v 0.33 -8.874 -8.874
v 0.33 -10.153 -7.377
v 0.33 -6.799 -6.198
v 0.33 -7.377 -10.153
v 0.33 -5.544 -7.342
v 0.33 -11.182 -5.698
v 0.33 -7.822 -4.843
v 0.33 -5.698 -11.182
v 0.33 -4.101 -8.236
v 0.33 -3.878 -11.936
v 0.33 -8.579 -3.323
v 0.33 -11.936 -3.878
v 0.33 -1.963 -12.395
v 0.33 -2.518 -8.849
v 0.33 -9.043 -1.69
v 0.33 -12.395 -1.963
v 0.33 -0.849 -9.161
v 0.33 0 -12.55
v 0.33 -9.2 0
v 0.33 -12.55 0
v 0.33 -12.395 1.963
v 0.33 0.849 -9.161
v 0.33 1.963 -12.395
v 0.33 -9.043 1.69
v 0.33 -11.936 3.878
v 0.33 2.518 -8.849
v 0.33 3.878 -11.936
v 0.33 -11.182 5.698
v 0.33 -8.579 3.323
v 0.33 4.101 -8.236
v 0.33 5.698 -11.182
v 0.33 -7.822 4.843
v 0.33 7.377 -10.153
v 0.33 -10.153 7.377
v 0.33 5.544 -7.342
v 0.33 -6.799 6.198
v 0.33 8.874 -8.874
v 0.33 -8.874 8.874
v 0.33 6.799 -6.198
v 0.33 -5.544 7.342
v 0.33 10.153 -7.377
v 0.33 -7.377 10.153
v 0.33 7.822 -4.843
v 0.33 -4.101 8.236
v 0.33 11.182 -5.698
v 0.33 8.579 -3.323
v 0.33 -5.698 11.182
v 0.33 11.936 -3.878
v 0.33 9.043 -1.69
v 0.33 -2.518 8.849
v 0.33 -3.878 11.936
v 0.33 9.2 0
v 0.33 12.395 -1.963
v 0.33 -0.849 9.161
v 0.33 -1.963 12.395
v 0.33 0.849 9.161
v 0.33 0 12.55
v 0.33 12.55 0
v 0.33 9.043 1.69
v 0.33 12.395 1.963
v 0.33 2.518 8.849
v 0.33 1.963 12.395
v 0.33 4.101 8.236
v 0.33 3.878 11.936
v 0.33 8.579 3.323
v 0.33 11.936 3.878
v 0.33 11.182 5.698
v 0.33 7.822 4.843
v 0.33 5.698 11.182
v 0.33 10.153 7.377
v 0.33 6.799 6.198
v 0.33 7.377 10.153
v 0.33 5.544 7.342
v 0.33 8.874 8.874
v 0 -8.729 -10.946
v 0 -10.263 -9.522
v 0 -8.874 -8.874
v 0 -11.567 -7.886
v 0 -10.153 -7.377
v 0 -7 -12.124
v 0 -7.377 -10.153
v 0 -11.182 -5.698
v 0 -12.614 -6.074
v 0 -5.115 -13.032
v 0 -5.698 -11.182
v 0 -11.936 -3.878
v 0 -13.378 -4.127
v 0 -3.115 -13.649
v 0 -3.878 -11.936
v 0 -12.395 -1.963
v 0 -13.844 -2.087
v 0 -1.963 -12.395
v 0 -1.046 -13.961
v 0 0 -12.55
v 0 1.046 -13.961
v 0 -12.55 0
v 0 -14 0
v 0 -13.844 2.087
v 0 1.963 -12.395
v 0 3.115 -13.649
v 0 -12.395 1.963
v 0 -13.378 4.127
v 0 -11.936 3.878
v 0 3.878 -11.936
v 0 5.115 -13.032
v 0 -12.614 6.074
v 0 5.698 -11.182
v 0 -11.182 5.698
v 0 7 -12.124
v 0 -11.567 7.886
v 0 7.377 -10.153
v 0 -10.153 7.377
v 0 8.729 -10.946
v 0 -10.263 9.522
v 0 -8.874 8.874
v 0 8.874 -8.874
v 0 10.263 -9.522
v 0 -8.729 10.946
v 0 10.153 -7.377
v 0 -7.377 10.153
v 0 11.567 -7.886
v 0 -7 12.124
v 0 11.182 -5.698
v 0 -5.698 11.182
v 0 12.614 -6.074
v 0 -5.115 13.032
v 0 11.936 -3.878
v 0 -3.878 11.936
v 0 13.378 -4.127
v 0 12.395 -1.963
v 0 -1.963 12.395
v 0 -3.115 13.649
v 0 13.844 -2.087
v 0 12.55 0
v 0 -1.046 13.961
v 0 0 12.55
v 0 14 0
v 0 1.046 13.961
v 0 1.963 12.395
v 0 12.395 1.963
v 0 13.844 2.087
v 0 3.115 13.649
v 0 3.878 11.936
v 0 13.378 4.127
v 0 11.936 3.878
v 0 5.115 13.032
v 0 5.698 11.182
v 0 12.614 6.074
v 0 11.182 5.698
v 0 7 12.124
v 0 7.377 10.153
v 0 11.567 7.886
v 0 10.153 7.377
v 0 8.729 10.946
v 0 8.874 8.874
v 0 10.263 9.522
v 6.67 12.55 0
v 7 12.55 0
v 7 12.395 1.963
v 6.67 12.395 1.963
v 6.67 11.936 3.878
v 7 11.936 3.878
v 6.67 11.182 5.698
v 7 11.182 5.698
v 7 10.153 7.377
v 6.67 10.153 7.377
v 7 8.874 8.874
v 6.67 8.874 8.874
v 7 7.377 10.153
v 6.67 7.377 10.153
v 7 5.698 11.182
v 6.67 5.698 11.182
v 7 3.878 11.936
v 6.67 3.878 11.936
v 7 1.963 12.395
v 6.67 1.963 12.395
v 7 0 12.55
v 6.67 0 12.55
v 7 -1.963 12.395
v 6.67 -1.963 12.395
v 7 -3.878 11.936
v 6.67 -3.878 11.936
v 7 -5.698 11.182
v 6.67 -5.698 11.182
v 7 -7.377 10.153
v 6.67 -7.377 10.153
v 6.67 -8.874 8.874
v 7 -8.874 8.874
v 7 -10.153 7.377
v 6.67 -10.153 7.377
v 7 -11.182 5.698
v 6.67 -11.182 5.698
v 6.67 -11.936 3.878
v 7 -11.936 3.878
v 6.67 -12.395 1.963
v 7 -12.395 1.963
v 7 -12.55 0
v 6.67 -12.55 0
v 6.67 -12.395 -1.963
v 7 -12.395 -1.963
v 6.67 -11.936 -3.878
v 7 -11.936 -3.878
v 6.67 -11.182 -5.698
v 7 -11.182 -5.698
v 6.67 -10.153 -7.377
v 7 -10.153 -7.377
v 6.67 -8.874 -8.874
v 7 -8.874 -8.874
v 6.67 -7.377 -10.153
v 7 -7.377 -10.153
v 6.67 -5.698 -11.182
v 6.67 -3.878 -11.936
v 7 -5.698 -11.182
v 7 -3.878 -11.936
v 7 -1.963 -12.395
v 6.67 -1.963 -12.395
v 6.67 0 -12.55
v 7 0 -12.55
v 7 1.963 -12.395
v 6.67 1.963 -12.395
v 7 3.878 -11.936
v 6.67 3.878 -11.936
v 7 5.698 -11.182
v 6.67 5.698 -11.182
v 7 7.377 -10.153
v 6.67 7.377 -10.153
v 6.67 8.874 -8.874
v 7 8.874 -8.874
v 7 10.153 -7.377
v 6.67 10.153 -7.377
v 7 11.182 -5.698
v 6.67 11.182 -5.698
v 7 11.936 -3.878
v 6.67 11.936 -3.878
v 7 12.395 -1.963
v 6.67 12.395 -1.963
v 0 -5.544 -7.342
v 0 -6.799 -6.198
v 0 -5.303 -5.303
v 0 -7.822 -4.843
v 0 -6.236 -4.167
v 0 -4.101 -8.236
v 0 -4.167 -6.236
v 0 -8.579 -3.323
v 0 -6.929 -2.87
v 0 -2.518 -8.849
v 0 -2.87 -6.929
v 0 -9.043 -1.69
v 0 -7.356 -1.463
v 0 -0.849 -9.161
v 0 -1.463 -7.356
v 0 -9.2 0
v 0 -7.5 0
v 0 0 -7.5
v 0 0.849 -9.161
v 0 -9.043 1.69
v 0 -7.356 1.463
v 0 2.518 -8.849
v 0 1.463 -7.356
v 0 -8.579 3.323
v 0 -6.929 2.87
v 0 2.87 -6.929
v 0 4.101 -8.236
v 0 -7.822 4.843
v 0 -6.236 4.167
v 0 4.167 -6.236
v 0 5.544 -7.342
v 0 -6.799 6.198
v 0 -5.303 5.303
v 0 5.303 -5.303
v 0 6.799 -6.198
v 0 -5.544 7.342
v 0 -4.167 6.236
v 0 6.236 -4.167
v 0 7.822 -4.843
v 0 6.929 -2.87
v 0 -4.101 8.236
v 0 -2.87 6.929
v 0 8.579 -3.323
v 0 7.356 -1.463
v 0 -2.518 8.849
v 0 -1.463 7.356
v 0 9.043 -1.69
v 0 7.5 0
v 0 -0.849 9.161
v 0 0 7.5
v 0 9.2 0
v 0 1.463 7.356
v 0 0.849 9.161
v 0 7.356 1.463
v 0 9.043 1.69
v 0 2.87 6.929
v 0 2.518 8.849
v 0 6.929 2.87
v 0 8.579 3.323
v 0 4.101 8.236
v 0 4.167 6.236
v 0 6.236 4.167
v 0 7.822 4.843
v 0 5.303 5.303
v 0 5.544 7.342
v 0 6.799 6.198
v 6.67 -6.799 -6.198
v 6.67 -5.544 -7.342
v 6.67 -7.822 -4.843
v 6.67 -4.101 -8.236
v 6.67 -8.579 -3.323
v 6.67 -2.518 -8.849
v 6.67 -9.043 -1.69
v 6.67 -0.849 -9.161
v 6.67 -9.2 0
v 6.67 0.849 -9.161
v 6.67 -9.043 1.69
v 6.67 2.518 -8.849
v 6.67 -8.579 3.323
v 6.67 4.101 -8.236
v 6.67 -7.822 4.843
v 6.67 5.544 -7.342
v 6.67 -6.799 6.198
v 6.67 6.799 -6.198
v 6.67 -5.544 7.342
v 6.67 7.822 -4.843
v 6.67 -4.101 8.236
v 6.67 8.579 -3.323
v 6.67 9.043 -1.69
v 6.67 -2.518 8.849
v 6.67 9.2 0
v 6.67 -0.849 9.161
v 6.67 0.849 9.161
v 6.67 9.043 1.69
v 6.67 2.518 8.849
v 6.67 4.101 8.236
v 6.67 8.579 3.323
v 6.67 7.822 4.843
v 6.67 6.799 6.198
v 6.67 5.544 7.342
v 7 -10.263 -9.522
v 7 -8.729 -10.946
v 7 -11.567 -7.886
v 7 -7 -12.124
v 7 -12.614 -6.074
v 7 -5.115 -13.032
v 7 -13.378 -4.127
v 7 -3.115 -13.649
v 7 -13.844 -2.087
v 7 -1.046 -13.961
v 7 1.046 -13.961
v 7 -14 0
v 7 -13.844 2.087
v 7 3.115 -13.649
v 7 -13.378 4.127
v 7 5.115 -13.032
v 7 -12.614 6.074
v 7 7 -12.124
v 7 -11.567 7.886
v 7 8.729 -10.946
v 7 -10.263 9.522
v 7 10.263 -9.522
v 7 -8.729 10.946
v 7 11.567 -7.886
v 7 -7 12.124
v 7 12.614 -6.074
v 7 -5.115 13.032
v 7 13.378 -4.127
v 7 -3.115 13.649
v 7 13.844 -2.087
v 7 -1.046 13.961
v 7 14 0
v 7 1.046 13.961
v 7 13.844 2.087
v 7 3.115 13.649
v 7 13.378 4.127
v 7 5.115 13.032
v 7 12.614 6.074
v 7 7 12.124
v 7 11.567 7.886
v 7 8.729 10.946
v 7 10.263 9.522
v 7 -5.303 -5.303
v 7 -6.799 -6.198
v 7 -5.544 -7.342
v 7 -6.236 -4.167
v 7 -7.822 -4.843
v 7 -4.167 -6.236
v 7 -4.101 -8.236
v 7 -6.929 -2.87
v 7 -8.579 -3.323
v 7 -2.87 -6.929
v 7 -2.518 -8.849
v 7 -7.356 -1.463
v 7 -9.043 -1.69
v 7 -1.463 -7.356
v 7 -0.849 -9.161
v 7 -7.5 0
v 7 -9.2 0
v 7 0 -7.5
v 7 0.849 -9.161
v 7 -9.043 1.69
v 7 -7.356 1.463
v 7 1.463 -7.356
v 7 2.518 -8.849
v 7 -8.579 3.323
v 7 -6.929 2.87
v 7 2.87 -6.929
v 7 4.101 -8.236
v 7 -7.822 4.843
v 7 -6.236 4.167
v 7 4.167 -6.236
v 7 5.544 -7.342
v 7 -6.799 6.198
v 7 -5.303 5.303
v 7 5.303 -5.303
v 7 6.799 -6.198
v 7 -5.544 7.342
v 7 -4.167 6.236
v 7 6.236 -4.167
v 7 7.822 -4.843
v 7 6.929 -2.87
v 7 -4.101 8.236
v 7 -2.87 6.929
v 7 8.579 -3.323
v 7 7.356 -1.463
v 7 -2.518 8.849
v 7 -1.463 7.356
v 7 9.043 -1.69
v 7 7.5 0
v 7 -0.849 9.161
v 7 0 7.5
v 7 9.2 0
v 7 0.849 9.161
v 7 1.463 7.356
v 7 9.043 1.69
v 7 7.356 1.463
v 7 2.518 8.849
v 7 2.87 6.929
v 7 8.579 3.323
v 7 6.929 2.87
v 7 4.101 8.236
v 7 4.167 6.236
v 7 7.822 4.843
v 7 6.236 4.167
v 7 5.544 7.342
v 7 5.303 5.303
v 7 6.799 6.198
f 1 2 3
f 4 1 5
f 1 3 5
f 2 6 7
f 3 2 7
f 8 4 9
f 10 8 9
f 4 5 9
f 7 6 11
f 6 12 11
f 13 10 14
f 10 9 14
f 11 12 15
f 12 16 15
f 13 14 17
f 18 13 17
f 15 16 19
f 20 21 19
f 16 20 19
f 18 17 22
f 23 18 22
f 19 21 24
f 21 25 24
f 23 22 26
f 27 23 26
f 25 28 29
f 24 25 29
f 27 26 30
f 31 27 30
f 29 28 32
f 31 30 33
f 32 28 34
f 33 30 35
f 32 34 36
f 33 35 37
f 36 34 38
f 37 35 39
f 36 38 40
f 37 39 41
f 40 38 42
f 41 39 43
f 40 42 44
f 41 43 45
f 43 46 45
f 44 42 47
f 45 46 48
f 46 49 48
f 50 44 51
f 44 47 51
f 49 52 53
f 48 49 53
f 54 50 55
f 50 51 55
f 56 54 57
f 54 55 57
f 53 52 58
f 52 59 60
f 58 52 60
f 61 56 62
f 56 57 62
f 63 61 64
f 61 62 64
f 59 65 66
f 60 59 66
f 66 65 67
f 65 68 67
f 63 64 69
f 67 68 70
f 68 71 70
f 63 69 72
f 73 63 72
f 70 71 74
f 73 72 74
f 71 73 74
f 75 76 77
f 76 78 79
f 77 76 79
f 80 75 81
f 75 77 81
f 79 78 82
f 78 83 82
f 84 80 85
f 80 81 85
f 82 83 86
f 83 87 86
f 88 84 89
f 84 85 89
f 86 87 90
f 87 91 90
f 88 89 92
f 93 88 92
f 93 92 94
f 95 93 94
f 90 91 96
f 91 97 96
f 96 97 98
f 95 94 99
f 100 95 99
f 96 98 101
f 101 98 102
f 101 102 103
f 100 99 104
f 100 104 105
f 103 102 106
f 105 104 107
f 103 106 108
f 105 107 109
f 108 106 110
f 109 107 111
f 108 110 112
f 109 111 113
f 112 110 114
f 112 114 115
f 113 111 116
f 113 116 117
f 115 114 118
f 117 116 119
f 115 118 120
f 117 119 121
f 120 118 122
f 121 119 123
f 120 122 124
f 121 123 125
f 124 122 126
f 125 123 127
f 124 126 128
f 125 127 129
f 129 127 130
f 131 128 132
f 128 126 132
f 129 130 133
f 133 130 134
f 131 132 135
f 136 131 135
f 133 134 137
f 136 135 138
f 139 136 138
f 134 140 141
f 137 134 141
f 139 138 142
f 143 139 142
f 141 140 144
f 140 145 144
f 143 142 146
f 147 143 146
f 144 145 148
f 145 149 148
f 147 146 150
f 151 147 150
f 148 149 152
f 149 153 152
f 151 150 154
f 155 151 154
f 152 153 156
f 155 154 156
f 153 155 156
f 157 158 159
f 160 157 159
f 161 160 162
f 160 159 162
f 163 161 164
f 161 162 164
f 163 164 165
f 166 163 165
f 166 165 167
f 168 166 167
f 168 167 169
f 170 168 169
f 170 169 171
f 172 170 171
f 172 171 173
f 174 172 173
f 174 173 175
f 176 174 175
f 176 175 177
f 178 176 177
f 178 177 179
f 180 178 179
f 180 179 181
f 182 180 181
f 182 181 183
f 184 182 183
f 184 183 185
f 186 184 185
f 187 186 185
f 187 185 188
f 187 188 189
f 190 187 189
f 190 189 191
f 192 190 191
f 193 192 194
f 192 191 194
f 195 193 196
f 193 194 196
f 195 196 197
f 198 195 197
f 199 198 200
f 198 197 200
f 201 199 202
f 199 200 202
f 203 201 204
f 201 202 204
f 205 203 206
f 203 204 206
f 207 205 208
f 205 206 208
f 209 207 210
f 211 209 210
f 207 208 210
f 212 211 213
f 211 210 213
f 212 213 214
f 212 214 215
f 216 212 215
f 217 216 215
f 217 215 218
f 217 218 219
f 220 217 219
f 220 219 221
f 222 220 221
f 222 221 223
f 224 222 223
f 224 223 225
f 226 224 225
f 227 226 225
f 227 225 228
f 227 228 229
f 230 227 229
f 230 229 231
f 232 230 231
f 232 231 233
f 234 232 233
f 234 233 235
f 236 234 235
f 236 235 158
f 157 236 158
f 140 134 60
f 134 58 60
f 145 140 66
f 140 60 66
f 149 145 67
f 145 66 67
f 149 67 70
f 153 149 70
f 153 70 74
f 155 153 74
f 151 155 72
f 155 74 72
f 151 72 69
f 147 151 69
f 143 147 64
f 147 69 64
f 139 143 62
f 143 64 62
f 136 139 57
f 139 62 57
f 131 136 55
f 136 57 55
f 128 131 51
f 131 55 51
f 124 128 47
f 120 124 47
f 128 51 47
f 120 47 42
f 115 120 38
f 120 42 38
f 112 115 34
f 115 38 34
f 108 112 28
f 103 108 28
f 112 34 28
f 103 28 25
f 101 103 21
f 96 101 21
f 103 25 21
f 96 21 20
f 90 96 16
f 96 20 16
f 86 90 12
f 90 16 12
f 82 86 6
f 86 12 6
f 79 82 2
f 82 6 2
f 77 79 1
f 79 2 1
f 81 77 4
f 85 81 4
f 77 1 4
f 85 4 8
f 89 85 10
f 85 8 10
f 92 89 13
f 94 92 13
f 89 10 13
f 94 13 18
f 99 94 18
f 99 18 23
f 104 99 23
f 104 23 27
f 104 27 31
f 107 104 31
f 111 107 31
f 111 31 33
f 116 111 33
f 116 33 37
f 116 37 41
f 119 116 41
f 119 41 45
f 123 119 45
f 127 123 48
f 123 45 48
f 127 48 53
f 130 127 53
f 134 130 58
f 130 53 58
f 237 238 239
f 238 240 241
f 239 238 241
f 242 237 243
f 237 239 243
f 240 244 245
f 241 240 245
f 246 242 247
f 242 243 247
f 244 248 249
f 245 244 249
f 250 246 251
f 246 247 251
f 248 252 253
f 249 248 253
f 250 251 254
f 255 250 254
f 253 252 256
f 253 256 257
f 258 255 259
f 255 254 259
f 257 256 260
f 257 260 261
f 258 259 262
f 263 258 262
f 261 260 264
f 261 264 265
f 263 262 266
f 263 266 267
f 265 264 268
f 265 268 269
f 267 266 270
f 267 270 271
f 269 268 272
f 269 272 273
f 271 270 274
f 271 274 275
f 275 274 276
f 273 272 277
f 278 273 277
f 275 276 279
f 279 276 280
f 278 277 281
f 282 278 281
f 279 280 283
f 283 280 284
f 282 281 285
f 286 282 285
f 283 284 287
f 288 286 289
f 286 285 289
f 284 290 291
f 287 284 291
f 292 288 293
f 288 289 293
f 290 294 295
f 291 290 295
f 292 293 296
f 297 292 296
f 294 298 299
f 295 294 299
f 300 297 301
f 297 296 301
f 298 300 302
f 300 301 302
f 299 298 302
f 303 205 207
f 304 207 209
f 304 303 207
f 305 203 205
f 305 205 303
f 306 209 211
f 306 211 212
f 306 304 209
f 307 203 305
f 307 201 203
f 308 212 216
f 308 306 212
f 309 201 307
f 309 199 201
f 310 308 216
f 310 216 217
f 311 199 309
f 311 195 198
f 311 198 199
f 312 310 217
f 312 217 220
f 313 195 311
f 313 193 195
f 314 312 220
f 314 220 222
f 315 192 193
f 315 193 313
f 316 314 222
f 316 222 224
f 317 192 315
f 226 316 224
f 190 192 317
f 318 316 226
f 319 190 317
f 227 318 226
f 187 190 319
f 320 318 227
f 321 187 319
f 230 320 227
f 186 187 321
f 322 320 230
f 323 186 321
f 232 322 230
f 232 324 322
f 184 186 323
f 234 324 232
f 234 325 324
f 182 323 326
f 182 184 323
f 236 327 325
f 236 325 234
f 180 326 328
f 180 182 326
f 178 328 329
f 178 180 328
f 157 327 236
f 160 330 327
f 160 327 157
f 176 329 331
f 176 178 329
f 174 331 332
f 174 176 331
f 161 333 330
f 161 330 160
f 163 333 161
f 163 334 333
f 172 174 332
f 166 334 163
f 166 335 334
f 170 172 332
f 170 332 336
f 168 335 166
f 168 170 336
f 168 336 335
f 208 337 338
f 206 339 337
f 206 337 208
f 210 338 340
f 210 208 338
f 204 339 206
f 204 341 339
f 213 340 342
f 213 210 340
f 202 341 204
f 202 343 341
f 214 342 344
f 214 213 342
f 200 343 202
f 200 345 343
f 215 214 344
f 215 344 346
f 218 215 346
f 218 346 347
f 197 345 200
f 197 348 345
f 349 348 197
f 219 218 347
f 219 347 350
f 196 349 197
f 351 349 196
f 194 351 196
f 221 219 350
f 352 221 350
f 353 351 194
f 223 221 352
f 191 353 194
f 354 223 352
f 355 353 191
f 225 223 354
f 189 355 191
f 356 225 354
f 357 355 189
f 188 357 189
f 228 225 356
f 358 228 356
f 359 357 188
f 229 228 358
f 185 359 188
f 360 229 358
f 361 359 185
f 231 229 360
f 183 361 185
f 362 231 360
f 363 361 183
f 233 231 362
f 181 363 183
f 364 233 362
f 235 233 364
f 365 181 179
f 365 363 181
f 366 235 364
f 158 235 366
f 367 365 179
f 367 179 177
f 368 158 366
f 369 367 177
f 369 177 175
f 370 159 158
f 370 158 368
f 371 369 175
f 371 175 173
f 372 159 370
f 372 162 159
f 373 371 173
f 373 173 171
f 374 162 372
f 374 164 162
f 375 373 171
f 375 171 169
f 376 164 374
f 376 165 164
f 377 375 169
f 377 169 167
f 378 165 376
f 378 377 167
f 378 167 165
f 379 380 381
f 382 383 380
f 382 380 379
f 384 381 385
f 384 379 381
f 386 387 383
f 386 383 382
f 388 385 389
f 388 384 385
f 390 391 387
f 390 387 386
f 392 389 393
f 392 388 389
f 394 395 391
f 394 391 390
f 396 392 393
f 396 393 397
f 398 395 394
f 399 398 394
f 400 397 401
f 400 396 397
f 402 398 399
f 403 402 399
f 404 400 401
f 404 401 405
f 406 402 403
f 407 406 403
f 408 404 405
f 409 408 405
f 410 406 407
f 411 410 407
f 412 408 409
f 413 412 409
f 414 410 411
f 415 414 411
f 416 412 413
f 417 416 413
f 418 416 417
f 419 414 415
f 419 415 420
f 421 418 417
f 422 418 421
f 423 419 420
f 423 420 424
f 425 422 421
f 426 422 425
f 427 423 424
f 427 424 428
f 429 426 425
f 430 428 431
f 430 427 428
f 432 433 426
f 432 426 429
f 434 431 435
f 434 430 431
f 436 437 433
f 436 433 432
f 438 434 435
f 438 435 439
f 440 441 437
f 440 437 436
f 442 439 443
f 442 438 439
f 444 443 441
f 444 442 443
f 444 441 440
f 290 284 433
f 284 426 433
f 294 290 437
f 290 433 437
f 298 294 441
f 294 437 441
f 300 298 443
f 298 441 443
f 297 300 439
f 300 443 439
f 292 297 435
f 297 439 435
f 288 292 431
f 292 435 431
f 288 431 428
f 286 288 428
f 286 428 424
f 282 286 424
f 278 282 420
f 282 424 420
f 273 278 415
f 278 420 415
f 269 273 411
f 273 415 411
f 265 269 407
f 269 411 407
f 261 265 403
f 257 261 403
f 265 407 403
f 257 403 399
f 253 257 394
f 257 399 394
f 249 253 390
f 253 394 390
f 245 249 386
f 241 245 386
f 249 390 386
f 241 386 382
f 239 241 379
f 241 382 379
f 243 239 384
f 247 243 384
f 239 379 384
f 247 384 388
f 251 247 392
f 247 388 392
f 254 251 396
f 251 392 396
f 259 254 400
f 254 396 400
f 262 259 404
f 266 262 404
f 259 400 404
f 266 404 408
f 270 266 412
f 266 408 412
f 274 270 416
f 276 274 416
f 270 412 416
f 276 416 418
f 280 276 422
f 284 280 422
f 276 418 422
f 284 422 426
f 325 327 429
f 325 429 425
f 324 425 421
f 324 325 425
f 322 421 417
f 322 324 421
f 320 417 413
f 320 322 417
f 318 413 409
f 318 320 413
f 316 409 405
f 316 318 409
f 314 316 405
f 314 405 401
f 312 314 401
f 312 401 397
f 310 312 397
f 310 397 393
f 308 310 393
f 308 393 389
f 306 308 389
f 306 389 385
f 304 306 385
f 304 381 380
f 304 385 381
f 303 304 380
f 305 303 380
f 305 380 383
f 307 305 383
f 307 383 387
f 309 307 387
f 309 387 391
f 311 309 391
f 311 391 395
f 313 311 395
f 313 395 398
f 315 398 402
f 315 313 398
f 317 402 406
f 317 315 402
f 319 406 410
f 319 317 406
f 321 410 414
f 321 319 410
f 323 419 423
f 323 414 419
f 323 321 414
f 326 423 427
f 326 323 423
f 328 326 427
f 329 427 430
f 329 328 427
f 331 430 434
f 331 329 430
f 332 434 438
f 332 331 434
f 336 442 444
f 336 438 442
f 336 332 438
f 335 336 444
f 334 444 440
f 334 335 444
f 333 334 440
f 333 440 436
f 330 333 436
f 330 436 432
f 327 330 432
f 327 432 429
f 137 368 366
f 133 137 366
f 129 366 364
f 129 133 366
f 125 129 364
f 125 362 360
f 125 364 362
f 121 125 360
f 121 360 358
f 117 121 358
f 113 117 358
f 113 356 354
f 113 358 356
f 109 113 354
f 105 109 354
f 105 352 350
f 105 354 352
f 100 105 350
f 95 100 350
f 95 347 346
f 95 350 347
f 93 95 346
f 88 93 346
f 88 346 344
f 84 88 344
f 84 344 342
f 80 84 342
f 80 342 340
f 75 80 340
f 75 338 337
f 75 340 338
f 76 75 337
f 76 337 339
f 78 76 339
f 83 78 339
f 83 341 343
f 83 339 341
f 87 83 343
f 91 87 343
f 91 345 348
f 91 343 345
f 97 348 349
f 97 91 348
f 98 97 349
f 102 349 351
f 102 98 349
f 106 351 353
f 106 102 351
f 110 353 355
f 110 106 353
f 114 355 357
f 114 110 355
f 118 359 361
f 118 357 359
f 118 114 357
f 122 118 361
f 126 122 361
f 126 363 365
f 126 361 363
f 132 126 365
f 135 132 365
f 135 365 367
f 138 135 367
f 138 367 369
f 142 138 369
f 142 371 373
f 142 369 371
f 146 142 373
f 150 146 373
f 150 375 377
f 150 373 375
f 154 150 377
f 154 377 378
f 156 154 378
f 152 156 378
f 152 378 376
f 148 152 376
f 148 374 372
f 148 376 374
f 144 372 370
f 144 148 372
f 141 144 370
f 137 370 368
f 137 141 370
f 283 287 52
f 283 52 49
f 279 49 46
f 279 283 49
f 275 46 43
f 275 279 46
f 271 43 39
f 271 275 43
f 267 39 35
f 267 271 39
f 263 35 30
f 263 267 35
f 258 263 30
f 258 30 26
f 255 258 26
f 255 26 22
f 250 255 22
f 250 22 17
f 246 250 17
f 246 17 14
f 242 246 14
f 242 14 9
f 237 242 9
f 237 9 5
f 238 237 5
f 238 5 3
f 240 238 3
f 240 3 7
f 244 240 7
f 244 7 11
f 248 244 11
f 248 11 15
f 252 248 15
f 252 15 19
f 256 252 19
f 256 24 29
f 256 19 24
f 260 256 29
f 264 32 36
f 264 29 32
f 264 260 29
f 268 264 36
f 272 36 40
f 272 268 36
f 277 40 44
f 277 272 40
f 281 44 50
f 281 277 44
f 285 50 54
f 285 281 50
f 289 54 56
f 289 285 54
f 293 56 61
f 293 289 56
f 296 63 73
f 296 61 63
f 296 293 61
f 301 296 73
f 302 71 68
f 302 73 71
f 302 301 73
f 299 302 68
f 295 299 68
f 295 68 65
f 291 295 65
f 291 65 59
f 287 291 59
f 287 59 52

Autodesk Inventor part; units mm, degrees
sketch "Sketch_1" plane through (0, 0, 0) normal (0, 0, 1) x (1, 0, 0)
  line L0 (50, 0) -> (-50, 0)
  line L1 (0, 12.55) -> (0.33, 12.55)
  line L2 (0.33, 12.55) -> (0.33, 9.2)
  line L3 (0.33, 9.2) -> (0, 9.2)
  line L4 (0, 9.2) -> (0, 7.5)
  line L5 (0, 7.5) -> (7, 7.5)
  line L6 (7, 7.5) -> (7, 9.2)
  line L7 (7, 9.2) -> (6.67, 9.2)
  line L8 (6.67, 9.2) -> (6.67, 12.55)
  line L9 (6.67, 12.55) -> (7, 12.55)
  line L10 (7, 12.55) -> (7, 14)
  line L11 (7, 14) -> (0, 14)
  line L12 (0, 14) -> (0, 12.55)
revolve "Revolution1" add sketch "Sketch_1" angle 360 about axis through (50, 0, 0) along (1, 0, 0)
ref_plane "to_cp1_XY" through (0, 0, 0) normal (1, 0, 0) x (0, 0, -1)
ref_plane "to_cp1_YZ" through (0, 0, 0) normal (0, 0, -1) x (0, 1, 0)
ref_plane "to_cp1_ZX" through (0, 0, 0) normal (0, 1, 0) x (1, 0, 0)
properties part number "C6902ZZ"
